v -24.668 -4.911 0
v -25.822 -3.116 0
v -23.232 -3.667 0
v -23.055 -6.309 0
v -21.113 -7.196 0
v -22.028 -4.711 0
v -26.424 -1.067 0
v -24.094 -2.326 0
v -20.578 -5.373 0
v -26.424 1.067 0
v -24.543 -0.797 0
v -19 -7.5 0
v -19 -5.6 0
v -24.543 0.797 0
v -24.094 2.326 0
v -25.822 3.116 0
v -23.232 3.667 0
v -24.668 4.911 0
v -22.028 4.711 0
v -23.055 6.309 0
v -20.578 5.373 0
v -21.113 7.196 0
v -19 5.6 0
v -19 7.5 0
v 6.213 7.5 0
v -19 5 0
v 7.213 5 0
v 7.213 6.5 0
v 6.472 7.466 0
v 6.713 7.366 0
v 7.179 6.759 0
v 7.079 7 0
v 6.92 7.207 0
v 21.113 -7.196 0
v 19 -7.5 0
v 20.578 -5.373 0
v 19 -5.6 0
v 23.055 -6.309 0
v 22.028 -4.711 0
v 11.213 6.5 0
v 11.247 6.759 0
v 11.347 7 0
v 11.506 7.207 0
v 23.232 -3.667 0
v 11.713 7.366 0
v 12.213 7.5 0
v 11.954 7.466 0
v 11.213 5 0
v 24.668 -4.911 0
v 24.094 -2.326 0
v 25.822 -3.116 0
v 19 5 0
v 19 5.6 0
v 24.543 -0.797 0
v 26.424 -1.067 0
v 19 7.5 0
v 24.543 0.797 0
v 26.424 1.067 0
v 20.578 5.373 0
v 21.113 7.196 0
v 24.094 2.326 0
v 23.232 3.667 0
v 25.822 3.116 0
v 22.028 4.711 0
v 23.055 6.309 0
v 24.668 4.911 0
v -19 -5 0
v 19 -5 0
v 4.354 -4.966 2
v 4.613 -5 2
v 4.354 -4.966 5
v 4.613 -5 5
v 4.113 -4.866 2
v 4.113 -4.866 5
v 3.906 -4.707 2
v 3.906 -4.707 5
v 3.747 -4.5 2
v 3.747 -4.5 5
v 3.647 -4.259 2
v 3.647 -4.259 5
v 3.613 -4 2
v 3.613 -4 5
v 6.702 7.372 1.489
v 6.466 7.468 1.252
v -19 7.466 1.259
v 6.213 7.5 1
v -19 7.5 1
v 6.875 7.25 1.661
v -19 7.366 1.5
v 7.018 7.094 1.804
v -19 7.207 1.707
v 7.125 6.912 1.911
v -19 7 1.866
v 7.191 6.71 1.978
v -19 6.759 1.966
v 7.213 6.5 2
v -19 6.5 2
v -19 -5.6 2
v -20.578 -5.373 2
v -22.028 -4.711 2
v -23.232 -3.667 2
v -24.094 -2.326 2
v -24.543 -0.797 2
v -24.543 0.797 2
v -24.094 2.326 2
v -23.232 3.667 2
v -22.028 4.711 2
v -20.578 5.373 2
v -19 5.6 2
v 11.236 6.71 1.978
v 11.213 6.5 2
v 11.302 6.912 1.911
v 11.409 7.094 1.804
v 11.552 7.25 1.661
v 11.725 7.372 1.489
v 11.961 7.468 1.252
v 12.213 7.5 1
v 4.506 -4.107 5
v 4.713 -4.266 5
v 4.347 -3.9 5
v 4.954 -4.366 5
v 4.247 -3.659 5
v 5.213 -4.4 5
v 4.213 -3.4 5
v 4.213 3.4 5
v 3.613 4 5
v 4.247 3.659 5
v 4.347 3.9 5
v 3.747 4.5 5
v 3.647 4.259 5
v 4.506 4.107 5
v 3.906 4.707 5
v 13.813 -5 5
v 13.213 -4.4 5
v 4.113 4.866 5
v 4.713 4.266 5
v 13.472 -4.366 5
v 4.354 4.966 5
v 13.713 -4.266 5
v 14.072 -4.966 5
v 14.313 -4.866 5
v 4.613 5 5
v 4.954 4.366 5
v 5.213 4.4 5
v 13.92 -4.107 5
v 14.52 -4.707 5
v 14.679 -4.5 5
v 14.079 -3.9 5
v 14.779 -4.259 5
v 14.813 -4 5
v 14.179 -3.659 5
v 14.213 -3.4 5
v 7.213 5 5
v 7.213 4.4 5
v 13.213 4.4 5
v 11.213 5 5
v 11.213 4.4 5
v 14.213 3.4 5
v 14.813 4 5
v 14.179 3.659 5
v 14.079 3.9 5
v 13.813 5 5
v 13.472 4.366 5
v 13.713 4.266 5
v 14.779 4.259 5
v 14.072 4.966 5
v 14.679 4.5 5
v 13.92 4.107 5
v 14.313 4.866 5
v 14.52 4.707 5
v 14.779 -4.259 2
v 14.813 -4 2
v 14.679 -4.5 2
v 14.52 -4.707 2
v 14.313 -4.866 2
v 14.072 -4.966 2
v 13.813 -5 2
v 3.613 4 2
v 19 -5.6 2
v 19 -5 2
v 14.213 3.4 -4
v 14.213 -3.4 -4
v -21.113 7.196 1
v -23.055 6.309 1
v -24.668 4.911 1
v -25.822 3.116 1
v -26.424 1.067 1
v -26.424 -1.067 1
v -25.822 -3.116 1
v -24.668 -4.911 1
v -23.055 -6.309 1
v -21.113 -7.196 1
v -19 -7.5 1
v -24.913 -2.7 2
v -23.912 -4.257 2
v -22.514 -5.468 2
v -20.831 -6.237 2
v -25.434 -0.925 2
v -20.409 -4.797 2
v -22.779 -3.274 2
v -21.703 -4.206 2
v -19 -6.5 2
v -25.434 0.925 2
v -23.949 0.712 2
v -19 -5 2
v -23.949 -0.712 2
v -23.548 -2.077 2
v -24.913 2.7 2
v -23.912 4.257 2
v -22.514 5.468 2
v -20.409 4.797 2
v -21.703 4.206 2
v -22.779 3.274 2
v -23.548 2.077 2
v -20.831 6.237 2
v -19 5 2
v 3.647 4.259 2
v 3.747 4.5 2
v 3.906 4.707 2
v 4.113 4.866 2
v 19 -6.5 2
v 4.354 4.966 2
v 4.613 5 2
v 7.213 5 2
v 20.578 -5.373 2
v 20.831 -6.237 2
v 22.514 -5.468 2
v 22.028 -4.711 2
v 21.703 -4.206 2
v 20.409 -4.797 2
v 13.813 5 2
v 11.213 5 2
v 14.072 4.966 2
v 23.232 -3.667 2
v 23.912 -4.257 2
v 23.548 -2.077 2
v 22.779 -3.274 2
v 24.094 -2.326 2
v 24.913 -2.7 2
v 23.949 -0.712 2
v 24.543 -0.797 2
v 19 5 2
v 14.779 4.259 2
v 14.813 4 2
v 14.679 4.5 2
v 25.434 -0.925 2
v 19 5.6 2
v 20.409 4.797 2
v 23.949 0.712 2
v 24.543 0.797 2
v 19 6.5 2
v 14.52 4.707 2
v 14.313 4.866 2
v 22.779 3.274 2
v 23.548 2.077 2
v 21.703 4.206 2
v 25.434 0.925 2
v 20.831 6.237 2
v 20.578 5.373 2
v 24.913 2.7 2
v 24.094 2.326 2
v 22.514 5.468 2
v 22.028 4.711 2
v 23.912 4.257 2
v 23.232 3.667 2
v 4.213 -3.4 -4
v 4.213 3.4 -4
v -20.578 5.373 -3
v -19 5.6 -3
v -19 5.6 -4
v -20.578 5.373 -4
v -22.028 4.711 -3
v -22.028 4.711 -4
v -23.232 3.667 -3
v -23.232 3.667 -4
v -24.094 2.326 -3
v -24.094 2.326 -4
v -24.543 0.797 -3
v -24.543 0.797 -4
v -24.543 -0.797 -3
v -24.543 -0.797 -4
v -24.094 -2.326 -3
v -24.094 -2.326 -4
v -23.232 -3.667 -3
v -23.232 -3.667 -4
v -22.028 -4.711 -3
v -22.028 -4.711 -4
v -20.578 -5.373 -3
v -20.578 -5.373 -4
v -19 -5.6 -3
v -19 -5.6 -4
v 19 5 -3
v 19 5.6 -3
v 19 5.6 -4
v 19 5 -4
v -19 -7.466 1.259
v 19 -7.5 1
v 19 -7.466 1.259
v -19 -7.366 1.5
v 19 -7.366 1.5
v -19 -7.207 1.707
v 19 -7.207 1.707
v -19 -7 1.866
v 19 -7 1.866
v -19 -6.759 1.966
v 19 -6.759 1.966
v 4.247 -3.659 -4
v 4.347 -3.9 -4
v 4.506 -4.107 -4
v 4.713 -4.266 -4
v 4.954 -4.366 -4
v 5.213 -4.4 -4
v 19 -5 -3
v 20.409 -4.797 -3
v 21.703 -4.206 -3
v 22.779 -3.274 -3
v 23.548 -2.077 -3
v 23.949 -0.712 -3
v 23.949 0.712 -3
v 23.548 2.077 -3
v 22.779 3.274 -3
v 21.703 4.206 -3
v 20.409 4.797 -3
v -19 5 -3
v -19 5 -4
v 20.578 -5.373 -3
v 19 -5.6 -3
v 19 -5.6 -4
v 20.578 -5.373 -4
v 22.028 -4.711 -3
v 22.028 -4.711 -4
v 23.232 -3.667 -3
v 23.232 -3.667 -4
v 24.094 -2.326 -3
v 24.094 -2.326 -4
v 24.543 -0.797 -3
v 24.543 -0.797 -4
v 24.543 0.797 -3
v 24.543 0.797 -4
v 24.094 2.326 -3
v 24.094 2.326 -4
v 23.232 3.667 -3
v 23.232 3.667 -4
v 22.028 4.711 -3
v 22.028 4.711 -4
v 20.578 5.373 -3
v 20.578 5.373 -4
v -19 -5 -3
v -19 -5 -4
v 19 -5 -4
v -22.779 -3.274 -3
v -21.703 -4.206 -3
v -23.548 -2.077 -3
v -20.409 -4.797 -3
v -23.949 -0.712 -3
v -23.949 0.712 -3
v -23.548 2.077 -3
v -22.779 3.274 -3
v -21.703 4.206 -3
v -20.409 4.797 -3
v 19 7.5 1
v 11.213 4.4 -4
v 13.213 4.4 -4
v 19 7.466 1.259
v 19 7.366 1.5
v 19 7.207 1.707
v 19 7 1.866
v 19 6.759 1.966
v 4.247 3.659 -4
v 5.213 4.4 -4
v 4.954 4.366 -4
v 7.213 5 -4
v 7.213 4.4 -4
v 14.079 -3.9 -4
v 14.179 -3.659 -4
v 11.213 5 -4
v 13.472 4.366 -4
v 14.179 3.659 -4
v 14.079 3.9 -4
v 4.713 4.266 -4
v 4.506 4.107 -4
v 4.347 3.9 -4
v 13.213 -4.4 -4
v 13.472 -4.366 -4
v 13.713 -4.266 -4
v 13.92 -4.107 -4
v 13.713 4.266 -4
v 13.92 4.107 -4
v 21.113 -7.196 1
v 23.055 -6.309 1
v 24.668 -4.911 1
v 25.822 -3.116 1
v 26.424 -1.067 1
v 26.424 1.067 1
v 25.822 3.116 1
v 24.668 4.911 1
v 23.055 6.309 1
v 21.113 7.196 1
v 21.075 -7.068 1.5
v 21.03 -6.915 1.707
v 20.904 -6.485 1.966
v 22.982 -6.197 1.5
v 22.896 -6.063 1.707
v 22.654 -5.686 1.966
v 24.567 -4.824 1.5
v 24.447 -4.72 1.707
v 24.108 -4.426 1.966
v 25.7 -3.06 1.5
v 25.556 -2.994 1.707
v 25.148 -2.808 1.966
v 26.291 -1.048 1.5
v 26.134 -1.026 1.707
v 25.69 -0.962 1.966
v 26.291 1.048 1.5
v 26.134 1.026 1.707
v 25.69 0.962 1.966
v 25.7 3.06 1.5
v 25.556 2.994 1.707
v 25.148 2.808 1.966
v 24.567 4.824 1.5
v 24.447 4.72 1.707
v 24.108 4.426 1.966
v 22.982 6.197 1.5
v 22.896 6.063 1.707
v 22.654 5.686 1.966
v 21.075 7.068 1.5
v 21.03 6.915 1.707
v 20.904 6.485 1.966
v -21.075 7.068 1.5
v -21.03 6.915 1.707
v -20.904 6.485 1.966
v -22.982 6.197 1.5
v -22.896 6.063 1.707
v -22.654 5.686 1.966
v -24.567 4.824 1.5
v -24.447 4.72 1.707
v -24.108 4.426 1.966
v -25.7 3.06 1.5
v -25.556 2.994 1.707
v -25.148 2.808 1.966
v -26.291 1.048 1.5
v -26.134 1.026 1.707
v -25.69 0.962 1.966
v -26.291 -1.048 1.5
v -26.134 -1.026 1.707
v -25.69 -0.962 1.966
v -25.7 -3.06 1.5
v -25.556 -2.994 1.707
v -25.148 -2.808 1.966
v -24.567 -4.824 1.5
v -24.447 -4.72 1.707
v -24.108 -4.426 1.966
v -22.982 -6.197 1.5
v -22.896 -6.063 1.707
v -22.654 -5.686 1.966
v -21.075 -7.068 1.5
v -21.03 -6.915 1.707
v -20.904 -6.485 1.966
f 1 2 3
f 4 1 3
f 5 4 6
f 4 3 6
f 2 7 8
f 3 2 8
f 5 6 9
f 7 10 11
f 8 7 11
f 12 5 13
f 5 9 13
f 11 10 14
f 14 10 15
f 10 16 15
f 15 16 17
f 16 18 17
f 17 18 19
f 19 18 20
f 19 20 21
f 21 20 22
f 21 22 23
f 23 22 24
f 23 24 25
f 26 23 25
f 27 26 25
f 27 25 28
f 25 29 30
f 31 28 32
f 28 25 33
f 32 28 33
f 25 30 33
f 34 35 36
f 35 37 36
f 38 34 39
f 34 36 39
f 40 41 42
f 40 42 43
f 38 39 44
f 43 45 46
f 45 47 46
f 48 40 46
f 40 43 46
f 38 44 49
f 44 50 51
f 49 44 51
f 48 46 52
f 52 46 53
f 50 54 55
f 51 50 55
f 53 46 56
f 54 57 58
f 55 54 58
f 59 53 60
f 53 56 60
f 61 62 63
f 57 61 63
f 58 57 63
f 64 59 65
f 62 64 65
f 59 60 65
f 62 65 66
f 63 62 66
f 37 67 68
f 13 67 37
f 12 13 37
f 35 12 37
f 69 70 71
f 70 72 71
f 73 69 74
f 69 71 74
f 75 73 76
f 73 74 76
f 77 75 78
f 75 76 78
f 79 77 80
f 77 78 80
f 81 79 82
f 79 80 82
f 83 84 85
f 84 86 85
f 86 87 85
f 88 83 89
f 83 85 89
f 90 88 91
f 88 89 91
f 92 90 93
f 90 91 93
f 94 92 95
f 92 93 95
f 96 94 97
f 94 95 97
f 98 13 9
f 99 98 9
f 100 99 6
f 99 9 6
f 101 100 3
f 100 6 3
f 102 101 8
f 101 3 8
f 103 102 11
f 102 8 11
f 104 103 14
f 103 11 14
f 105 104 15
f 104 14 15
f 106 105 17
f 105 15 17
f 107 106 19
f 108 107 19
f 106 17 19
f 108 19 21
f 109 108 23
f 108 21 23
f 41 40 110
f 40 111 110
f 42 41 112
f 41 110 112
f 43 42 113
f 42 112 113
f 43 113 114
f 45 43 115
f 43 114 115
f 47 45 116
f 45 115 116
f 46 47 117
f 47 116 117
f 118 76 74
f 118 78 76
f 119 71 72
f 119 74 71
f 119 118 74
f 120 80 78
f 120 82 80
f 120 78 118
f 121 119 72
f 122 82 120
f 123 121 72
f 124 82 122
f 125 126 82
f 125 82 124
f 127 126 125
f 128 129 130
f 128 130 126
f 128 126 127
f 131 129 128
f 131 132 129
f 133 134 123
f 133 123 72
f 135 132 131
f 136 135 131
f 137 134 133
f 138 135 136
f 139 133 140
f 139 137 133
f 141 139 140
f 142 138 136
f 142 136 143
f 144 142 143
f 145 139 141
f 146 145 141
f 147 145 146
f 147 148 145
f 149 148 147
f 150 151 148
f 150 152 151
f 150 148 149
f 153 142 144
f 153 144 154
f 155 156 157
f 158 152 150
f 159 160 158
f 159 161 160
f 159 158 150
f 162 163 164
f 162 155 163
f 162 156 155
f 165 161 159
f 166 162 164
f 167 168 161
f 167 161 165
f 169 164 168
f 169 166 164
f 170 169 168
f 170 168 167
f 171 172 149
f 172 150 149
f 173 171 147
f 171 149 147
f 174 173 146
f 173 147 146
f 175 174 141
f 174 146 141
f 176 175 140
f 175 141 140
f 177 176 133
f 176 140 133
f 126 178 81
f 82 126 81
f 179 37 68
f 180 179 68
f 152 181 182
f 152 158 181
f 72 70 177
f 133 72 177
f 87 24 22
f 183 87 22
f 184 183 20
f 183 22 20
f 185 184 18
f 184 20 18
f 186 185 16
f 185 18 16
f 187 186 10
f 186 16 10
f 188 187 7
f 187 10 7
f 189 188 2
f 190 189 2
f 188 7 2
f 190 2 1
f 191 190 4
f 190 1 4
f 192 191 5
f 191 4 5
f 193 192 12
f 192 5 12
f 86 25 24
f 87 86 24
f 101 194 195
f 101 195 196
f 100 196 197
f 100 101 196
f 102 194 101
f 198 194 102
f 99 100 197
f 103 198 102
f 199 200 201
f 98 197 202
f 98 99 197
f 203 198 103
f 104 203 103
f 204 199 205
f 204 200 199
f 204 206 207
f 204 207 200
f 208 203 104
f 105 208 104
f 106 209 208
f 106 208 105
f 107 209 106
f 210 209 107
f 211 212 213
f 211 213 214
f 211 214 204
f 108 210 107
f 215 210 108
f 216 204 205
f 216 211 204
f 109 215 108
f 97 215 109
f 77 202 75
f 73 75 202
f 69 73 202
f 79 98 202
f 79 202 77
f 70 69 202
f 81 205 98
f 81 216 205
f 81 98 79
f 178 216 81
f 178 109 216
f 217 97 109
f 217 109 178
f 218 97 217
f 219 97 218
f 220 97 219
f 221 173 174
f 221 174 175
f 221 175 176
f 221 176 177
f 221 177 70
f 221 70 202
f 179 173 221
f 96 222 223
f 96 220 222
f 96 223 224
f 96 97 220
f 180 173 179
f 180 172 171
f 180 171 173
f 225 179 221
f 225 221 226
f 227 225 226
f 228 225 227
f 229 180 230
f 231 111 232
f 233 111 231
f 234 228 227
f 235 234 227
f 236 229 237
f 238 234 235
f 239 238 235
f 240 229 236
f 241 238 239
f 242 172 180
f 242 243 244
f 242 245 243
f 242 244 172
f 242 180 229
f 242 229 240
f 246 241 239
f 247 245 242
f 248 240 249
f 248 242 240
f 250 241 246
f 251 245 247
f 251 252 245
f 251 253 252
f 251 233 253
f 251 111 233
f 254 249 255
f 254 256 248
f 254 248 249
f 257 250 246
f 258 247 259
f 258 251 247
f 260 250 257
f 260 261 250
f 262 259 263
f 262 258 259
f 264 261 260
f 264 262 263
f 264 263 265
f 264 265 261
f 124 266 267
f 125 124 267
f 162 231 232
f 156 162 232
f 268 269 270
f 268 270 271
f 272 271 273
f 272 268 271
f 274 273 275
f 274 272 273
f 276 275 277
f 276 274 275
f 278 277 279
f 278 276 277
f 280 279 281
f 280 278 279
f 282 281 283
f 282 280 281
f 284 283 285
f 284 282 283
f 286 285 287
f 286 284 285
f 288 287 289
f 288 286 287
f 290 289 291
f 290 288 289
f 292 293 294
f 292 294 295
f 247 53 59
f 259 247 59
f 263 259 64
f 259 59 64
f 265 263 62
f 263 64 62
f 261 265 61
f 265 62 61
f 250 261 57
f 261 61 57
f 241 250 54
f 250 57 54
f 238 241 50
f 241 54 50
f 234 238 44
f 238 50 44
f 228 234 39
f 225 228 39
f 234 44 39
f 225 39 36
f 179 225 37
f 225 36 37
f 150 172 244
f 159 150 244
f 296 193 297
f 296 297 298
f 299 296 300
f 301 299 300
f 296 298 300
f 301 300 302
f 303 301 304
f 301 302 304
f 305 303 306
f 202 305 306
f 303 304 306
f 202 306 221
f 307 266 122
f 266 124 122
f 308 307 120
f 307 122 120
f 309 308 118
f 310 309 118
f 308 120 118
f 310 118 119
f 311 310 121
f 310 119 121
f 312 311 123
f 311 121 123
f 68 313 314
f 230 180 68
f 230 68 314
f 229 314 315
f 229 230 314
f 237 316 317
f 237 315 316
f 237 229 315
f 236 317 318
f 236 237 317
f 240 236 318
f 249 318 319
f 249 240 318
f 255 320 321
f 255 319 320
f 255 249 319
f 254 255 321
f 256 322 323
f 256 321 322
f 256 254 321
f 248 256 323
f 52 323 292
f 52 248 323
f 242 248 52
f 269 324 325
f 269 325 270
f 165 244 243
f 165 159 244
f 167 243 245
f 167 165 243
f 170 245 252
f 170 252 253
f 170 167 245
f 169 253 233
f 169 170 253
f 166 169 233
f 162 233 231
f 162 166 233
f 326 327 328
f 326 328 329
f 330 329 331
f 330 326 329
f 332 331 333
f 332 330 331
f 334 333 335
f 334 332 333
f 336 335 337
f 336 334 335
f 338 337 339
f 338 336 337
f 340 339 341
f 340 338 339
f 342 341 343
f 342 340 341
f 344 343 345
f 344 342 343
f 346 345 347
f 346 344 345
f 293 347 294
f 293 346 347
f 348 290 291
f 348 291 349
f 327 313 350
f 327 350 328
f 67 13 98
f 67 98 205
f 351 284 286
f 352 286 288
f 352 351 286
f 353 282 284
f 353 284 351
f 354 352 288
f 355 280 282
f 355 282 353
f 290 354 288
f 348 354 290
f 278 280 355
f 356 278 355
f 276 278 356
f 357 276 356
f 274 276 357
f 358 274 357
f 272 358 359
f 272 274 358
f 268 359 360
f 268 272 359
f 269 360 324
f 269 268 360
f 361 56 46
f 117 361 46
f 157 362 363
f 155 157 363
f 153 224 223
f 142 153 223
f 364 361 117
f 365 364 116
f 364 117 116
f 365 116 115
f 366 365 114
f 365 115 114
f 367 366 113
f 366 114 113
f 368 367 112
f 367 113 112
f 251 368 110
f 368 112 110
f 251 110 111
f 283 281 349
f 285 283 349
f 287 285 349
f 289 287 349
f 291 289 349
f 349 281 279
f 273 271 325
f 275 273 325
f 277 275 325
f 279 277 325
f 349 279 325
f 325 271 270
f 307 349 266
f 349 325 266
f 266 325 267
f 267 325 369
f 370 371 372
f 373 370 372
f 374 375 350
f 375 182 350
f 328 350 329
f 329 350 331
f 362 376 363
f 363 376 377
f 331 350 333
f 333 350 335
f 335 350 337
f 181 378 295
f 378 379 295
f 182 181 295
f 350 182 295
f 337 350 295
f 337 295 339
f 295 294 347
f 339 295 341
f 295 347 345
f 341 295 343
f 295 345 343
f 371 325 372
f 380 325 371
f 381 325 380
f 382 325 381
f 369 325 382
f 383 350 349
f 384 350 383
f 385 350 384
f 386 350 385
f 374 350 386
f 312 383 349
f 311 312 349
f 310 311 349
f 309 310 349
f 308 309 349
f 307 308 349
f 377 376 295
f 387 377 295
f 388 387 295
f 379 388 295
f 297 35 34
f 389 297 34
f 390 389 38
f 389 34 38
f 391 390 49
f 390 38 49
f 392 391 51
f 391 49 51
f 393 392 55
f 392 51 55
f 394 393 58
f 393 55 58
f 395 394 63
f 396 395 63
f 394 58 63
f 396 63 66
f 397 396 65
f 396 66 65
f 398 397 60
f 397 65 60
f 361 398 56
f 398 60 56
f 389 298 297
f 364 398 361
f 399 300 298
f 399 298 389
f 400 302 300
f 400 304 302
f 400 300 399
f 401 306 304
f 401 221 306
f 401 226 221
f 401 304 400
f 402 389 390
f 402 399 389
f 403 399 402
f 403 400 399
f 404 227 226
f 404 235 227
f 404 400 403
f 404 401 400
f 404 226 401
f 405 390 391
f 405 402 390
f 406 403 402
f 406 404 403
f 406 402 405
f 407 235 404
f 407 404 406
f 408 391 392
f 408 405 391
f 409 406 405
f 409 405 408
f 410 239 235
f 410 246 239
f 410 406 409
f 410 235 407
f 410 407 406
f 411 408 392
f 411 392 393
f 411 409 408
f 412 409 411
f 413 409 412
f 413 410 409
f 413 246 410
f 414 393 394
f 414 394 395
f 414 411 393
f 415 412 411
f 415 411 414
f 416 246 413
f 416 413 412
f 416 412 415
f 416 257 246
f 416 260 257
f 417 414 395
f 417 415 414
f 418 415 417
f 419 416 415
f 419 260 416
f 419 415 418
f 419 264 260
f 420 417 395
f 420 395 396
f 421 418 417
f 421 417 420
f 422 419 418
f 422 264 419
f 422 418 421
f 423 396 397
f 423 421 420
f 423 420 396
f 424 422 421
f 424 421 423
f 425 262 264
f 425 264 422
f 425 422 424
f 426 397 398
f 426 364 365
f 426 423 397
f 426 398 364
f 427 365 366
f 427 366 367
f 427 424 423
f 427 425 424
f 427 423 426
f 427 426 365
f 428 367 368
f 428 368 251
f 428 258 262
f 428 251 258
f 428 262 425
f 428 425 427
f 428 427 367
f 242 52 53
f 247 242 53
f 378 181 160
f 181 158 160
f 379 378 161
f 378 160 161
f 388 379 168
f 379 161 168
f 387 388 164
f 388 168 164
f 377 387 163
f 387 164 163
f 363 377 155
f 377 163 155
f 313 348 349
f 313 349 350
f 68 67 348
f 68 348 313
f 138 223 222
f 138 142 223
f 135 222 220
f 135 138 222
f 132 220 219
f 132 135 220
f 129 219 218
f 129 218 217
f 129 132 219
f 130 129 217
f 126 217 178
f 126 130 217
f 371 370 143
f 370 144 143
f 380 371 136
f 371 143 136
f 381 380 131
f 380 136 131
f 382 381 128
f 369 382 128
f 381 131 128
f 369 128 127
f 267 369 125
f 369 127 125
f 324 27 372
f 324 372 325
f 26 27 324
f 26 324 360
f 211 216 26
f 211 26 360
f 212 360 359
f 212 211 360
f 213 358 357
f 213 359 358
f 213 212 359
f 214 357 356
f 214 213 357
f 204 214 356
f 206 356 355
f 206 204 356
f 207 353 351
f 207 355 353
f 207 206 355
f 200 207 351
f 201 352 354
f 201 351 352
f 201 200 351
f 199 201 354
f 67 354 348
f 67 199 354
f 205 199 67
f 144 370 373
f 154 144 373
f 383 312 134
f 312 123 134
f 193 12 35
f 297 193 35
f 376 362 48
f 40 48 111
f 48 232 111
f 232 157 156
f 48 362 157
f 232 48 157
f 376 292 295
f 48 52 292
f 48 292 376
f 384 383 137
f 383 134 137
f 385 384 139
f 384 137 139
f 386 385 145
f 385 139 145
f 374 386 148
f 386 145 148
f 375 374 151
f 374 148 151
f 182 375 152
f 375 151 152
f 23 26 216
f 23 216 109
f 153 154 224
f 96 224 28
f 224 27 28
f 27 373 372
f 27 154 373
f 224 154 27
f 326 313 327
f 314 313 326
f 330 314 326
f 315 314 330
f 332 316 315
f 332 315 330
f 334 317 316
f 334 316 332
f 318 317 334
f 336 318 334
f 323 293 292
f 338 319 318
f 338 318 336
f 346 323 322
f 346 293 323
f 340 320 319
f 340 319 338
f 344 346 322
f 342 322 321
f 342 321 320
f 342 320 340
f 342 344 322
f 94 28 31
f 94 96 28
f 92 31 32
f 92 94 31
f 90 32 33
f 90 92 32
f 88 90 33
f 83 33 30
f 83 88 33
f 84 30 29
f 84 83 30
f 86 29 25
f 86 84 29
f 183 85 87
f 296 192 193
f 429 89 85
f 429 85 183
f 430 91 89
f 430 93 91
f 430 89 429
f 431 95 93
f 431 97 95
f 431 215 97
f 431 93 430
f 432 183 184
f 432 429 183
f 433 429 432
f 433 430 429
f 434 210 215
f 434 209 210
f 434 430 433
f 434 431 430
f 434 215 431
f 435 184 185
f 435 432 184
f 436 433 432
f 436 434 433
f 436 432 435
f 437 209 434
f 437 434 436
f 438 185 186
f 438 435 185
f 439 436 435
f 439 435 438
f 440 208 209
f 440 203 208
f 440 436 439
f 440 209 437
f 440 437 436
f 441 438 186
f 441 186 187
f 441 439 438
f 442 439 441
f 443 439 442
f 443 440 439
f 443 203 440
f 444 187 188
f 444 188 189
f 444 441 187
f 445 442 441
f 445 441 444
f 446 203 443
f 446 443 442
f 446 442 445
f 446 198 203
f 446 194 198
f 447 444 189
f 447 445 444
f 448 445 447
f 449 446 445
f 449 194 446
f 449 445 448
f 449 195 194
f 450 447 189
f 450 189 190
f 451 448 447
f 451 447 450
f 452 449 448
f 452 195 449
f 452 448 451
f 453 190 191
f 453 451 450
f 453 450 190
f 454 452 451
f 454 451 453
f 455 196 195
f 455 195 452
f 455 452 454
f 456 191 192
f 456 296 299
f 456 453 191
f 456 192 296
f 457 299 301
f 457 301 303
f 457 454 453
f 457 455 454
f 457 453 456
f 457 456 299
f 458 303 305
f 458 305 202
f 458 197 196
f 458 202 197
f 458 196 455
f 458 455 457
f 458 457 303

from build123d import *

# Parameters (mm, degrees)
F0_W     = 22.6132244859
F0_H     = 0.6
F0_W_2   = 4.1867755141
F0_W_3   = 10
F0_W_4   = 3
F1_DEPTH = 2
F2_DEPTH = 4
F3_START = -3
F3_DEPTH = 1
F4_DEPTH = 5
F5_R     = 1


with BuildPart() as f1:
    # F0 (on Top) → F1 (new body)
    with BuildSketch(Plane.XY):
        with BuildLine():
            ThreePointArc((-19, -5.6), (-24.6, 0), (-19, 5.6))
            Line((-19, 5.6), (3.6132244859, 5.6))
            Line((3.6132244859, 5.6), (7.2132244859, 5.6))
            Line((7.2132244859, 5.6), (7.2132244859, 7.5))
            Line((7.2132244859, 7.5), (-19, 7.5))
            ThreePointArc((-19, 7.5), (-26.5, 0), (-19, -7.5))
            Line((-19, -7.5), (19, -7.5))
            ThreePointArc((19, -7.5), (26.5, 0), (19, 7.5))
            Line((19, 7.5), (11.2132244859, 7.5))
            Line((11.2132244859, 7.5), (11.2132244859, 5.6))
            Line((11.2132244859, 5.6), (14.8132244859, 5.6))
            Line((14.8132244859, 5.6), (19, 5.6))
            ThreePointArc((19, 5.6), (24.6, 0), (19, -5.6))
            Line((19, -5.6), (14.8132244859, -5.6))
            Line((14.8132244859, -5.6), (3.6132244859, -5.6))
            Line((3.6132244859, -5.6), (-19, -5.6))
        make_face()
        with Locations((-7.6933877571, 5.3)):
            Rectangle(F0_W, F0_H)
        with Locations((16.9066122429, 5.3)):
            Rectangle(F0_W_2, F0_H)
        with Locations((-7.6933877571, -5.3)):
            Rectangle(F0_W, F0_H)
        with Locations((16.9066122429, -5.3)):
            Rectangle(F0_W_2, F0_H)
        with BuildLine():
            Line((3.6132244859, 5), (-19, 5))
            ThreePointArc((-19, 5), (-24, 0), (-19, -5))
            Line((-19, -5), (3.6132244859, -5))
            Line((3.6132244859, -5), (3.6132244859, 5))
        make_face()
        Polygon((4.2132244859, 5), (3.6132244859, 5), (3.6132244859, -5), (4.2132244859, -5), (4.2132244859, -4.4), (4.2132244859, 4.4), align=None)
        Polygon((3.6132244859, 5.6), (3.6132244859, 5), (4.2132244859, 5), (7.2132244859, 5), (7.2132244859, 5.6), align=None)
        with BuildLine():
            Line((14.8132244859, 5), (14.8132244859, -5))
            Line((14.8132244859, -5), (19, -5))
            ThreePointArc((19, -5), (24, 0), (19, 5))
            Line((19, 5), (14.8132244859, 5))
        make_face()
        Polygon((4.2132244859, -5), (3.6132244859, -5), (3.6132244859, -5.6), (14.8132244859, -5.6), (14.8132244859, -5), (14.2132244859, -5), align=None)
        Polygon((14.2132244859, -4.4), (14.2132244859, -5), (14.8132244859, -5), (14.8132244859, 5), (14.2132244859, 5), (14.2132244859, 4.4), align=None)
        Polygon((14.2132244859, 5), (14.8132244859, 5), (14.8132244859, 5.6), (11.2132244859, 5.6), (11.2132244859, 5), align=None)
        with Locations((9.2132244859, -4.7)):
            Rectangle(F0_W_3, F0_H)
        with Locations((5.7132244859, 4.7)):
            Rectangle(F0_W_4, F0_H)
        with Locations((12.7132244859, 4.7)):
            Rectangle(F0_W_4, F0_H)
    extrude(amount=F1_DEPTH)

    # F0 (on Top) → F2 (join)
    with BuildSketch(Plane.XY):
        with BuildLine():
            Line((3.6132244859, 5), (-19, 5))
            ThreePointArc((-19, 5), (-24, 0), (-19, -5))
            Line((-19, -5), (3.6132244859, -5))
            Line((3.6132244859, -5), (3.6132244859, 5))
        make_face()
        with BuildLine():
            Line((14.8132244859, 5), (14.8132244859, -5))
            Line((14.8132244859, -5), (19, -5))
            ThreePointArc((19, -5), (24, 0), (19, 5))
            Line((19, 5), (14.8132244859, 5))
        make_face()
        Polygon((4.2132244859, 5), (3.6132244859, 5), (3.6132244859, -5), (4.2132244859, -5), (4.2132244859, -4.4), (4.2132244859, 4.4), align=None)
        Polygon((14.2132244859, -4.4), (14.2132244859, -5), (14.8132244859, -5), (14.8132244859, 5), (14.2132244859, 5), (14.2132244859, 4.4), align=None)
        with Locations((9.2132244859, -4.7)):
            Rectangle(F0_W_3, F0_H)
        with Locations((5.7132244859, 4.7)):
            Rectangle(F0_W_4, F0_H)
        with Locations((12.7132244859, 4.7)):
            Rectangle(F0_W_4, F0_H)
    extrude(amount=-F2_DEPTH)

    # F0 (on Top) → F3 (join)
    with BuildSketch(Plane.XY.offset(F3_START)):
        with BuildLine():
            ThreePointArc((-19, -5), (-24, 0), (-19, 5))
            Line((-19, 5), (-19, 5.6))
            ThreePointArc((-19, 5.6), (-24.6, 0), (-19, -5.6))
            Line((-19, -5.6), (-19, -5))
        make_face()
        with BuildLine():
            Line((19, -5), (19, -5.6))
            ThreePointArc((19, -5.6), (24.6, 0), (19, 5.6))
            Line((19, 5.6), (19, 5))
            ThreePointArc((19, 5), (24, 0), (19, -5))
        make_face()
    extrude(amount=-F3_DEPTH)

    # F0 (on Top) → F4 (join)
    with BuildSketch(Plane.XY):
        Polygon((4.2132244859, 5), (3.6132244859, 5), (3.6132244859, -5), (4.2132244859, -5), (4.2132244859, -4.4), (4.2132244859, 4.4), align=None)
        Polygon((14.2132244859, -4.4), (14.2132244859, -5), (14.8132244859, -5), (14.8132244859, 5), (14.2132244859, 5), (14.2132244859, 4.4), align=None)
        with Locations((9.2132244859, -4.7)):
            Rectangle(F0_W_3, F0_H)
        with Locations((5.7132244859, 4.7)):
            Rectangle(F0_W_4, F0_H)
        with Locations((12.7132244859, 4.7)):
            Rectangle(F0_W_4, F0_H)
    extrude(amount=F4_DEPTH)

    # F5
    f5_edges = [f1.edges().sort_by_distance(p)[0] for p in [
        (11.213224, 7.5, 1),
        (7.213224, 7.5, 1),
        (0, -7.5, 2),
        (4.213224, -4.4, 0.5),
        (14.213224, -4.4, 0.5),
        (3.613224, -5, 3.5),
        (14.813224, -5, 3.5),
        (14.813224, 5, 3.5),
        (3.613224, 5, 3.5),
        (4.213224, 4.4, 0.5),
        (14.213224, 4.4, 0.5),
    ]]
    fillet(f5_edges, radius=F5_R)


solid = f1.part
